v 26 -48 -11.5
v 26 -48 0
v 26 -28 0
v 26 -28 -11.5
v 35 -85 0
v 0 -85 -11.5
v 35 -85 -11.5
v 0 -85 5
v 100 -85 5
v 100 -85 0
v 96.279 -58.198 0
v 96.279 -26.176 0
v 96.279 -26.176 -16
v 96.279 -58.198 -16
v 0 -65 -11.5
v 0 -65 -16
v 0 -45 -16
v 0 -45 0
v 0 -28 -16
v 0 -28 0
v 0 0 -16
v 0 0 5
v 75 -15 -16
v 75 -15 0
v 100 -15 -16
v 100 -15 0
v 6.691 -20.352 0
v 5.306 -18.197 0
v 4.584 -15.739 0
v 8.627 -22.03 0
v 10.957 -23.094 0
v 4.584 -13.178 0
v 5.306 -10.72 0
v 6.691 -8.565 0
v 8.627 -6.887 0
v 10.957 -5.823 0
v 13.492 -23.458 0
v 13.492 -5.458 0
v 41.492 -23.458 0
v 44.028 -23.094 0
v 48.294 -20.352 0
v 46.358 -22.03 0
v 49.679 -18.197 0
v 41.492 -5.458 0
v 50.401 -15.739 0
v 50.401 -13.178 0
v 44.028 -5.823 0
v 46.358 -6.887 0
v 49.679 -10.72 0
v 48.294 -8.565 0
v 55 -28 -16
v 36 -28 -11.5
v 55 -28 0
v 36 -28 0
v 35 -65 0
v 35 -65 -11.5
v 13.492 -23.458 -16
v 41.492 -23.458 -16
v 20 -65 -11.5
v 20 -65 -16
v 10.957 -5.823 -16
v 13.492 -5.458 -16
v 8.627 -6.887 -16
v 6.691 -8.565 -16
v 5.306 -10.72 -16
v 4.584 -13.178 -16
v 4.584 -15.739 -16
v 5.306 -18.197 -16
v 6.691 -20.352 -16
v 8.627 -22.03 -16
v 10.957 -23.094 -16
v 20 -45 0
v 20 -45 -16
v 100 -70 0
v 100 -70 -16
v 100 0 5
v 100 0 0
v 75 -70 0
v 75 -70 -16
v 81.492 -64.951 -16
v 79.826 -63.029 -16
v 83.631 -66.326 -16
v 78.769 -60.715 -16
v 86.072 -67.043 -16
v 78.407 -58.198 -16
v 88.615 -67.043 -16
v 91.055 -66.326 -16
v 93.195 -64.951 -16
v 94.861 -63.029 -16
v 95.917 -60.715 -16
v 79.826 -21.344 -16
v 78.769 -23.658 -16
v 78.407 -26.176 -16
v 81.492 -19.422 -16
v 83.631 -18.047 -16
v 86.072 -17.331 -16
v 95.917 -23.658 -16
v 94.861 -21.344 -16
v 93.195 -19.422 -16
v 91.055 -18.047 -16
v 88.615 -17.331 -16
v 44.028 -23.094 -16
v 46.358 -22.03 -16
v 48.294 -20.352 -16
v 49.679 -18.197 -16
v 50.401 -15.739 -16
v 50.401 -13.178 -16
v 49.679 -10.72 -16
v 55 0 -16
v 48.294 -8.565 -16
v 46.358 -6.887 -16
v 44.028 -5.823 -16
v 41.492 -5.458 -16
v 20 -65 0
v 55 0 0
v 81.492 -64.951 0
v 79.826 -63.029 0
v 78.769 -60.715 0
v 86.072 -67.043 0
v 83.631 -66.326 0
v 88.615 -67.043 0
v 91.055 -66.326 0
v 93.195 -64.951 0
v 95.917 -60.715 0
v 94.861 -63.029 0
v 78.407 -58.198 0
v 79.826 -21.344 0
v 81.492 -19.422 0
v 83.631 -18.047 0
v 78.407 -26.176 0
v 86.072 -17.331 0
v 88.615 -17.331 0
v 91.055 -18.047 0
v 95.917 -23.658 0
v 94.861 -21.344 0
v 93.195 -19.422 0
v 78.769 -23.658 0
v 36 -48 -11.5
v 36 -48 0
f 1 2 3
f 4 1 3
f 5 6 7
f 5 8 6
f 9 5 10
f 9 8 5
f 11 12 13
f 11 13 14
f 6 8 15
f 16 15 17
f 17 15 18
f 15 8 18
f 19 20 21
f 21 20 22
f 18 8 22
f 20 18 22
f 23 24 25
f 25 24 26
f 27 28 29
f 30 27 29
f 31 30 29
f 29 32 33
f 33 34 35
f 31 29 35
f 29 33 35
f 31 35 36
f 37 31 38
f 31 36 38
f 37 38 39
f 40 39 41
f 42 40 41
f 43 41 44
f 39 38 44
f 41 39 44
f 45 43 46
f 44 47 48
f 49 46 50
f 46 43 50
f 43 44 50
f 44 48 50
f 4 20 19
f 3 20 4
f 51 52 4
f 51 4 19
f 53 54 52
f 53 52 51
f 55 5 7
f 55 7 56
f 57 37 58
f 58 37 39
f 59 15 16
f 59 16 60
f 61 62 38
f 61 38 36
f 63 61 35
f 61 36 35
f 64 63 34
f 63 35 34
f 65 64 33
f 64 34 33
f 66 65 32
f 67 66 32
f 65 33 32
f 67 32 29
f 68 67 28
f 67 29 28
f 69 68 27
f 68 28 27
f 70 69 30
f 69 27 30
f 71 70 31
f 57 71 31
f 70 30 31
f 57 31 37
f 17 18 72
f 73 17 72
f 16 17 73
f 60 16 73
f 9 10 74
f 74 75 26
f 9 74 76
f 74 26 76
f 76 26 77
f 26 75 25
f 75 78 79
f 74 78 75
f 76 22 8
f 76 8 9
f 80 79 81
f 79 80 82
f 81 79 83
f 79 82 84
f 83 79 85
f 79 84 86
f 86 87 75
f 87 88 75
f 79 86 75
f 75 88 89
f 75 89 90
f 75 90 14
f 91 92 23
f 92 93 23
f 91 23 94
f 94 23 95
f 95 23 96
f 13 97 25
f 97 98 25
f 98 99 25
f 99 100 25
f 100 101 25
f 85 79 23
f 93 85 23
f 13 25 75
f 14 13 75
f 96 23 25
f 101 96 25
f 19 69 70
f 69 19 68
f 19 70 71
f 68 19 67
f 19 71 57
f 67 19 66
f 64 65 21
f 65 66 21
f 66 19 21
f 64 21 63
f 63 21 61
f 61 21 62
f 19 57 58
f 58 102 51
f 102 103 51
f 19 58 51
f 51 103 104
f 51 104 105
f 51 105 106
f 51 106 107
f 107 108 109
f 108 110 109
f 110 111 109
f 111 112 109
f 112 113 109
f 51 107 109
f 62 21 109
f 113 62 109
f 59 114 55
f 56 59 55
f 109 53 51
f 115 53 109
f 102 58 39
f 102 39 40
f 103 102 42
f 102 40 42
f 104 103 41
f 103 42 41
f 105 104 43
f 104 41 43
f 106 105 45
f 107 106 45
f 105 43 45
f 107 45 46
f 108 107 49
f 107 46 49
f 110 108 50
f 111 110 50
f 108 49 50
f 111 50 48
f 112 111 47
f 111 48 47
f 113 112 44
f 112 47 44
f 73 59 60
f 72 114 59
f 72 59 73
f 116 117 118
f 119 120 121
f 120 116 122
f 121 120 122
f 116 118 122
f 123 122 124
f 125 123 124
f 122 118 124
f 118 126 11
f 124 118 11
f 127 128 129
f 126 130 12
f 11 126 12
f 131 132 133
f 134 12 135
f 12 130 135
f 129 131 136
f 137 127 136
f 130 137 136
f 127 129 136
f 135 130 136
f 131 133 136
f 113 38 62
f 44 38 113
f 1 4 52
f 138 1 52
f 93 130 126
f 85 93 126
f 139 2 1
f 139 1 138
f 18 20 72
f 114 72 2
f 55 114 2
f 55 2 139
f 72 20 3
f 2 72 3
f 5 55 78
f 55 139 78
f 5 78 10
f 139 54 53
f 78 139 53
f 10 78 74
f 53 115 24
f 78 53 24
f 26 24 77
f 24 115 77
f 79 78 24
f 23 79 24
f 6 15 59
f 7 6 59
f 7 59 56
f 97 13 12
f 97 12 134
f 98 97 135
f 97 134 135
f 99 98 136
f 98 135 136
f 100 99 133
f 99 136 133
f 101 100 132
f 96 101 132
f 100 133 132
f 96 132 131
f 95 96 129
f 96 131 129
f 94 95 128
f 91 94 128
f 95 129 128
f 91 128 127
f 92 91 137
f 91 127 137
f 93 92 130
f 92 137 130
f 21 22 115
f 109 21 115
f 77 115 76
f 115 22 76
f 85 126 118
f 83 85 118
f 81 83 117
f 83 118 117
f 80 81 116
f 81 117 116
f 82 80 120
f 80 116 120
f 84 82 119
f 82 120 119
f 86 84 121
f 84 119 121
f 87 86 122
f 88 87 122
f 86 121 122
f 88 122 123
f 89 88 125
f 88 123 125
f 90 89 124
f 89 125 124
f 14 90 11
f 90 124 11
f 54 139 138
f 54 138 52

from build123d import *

# Parameters (mm, degrees)
SKETCH_W      = 100
SKETCH_H      = 85
PAD_DEPTH     = 5
SKETCH001_W   = 55
SKETCH001_H   = 28
SKETCH001_W_2 = 25
SKETCH001_H_2 = 55
SKETCH001_W_3 = 20
SKETCH001_H_3 = 20
PAD001_DEPTH  = 16
SKETCH002_W   = 35
SKETCH002_H   = 20
SKETCH002_W_2 = 10
PAD002_DEPTH  = 11.5


with BuildPart() as pad002:
    # Sketch → Pad (new body)
    with BuildSketch(Plane.XY):
        with Locations((50, -42.5)):
            Rectangle(SKETCH_W, SKETCH_H)
    extrude(amount=-PAD_DEPTH)

    # Sketch001 → Pad001 (new body)
    with BuildSketch(Plane.XY):
        with Locations((27.5, -14)):
            Rectangle(SKETCH001_W, SKETCH001_H)
        with BuildLine():
            ThreePointArc((13.492439, -5.458467), (4.492439, -14.458467), (13.492439, -23.458467))
            Line((13.492439, -23.458467), (41.492439, -23.458467))
            ThreePointArc((41.492439, -23.458467), (50.492439, -14.458467), (41.492439, -5.458467))
            Line((13.492439, -5.458467), (41.492439, -5.458467))
        make_face(mode=Mode.SUBTRACT)
        with Locations((87.5, -42.5)):
            Rectangle(SKETCH001_W_2, SKETCH001_H_2)
        with BuildLine():
            ThreePointArc((96.279266, -26.175545), (87.343376, -17.239655), (78.407486, -26.175545))
            Line((78.407486, -26.175545), (78.407486, -58.197685))
            ThreePointArc((78.407486, -58.197685), (87.343376, -67.133575), (96.279266, -58.197685))
            Line((96.279266, -26.175545), (96.279266, -58.197685))
        make_face(mode=Mode.SUBTRACT)
        with Locations((10, -55)):
            Rectangle(SKETCH001_W_3, SKETCH001_H_3)
    extrude(amount=PAD001_DEPTH)

    # Sketch002 → Pad002 (new body)
    with BuildSketch(Plane.XY):
        with Locations((17.5, -75)):
            Rectangle(SKETCH002_W, SKETCH002_H)
        with Locations((31, -38)):
            Rectangle(SKETCH002_W_2, SKETCH002_H)
    extrude(amount=PAD002_DEPTH)


with BuildPart() as part_mirroring:
    # Part__Mirroring: instance of Pad002
    add(pad002.part.mirror(Plane(origin=(0, 0, 0), x_dir=(0, 1, 0), z_dir=(0, 0, 1))))


solid = part_mirroring.part
